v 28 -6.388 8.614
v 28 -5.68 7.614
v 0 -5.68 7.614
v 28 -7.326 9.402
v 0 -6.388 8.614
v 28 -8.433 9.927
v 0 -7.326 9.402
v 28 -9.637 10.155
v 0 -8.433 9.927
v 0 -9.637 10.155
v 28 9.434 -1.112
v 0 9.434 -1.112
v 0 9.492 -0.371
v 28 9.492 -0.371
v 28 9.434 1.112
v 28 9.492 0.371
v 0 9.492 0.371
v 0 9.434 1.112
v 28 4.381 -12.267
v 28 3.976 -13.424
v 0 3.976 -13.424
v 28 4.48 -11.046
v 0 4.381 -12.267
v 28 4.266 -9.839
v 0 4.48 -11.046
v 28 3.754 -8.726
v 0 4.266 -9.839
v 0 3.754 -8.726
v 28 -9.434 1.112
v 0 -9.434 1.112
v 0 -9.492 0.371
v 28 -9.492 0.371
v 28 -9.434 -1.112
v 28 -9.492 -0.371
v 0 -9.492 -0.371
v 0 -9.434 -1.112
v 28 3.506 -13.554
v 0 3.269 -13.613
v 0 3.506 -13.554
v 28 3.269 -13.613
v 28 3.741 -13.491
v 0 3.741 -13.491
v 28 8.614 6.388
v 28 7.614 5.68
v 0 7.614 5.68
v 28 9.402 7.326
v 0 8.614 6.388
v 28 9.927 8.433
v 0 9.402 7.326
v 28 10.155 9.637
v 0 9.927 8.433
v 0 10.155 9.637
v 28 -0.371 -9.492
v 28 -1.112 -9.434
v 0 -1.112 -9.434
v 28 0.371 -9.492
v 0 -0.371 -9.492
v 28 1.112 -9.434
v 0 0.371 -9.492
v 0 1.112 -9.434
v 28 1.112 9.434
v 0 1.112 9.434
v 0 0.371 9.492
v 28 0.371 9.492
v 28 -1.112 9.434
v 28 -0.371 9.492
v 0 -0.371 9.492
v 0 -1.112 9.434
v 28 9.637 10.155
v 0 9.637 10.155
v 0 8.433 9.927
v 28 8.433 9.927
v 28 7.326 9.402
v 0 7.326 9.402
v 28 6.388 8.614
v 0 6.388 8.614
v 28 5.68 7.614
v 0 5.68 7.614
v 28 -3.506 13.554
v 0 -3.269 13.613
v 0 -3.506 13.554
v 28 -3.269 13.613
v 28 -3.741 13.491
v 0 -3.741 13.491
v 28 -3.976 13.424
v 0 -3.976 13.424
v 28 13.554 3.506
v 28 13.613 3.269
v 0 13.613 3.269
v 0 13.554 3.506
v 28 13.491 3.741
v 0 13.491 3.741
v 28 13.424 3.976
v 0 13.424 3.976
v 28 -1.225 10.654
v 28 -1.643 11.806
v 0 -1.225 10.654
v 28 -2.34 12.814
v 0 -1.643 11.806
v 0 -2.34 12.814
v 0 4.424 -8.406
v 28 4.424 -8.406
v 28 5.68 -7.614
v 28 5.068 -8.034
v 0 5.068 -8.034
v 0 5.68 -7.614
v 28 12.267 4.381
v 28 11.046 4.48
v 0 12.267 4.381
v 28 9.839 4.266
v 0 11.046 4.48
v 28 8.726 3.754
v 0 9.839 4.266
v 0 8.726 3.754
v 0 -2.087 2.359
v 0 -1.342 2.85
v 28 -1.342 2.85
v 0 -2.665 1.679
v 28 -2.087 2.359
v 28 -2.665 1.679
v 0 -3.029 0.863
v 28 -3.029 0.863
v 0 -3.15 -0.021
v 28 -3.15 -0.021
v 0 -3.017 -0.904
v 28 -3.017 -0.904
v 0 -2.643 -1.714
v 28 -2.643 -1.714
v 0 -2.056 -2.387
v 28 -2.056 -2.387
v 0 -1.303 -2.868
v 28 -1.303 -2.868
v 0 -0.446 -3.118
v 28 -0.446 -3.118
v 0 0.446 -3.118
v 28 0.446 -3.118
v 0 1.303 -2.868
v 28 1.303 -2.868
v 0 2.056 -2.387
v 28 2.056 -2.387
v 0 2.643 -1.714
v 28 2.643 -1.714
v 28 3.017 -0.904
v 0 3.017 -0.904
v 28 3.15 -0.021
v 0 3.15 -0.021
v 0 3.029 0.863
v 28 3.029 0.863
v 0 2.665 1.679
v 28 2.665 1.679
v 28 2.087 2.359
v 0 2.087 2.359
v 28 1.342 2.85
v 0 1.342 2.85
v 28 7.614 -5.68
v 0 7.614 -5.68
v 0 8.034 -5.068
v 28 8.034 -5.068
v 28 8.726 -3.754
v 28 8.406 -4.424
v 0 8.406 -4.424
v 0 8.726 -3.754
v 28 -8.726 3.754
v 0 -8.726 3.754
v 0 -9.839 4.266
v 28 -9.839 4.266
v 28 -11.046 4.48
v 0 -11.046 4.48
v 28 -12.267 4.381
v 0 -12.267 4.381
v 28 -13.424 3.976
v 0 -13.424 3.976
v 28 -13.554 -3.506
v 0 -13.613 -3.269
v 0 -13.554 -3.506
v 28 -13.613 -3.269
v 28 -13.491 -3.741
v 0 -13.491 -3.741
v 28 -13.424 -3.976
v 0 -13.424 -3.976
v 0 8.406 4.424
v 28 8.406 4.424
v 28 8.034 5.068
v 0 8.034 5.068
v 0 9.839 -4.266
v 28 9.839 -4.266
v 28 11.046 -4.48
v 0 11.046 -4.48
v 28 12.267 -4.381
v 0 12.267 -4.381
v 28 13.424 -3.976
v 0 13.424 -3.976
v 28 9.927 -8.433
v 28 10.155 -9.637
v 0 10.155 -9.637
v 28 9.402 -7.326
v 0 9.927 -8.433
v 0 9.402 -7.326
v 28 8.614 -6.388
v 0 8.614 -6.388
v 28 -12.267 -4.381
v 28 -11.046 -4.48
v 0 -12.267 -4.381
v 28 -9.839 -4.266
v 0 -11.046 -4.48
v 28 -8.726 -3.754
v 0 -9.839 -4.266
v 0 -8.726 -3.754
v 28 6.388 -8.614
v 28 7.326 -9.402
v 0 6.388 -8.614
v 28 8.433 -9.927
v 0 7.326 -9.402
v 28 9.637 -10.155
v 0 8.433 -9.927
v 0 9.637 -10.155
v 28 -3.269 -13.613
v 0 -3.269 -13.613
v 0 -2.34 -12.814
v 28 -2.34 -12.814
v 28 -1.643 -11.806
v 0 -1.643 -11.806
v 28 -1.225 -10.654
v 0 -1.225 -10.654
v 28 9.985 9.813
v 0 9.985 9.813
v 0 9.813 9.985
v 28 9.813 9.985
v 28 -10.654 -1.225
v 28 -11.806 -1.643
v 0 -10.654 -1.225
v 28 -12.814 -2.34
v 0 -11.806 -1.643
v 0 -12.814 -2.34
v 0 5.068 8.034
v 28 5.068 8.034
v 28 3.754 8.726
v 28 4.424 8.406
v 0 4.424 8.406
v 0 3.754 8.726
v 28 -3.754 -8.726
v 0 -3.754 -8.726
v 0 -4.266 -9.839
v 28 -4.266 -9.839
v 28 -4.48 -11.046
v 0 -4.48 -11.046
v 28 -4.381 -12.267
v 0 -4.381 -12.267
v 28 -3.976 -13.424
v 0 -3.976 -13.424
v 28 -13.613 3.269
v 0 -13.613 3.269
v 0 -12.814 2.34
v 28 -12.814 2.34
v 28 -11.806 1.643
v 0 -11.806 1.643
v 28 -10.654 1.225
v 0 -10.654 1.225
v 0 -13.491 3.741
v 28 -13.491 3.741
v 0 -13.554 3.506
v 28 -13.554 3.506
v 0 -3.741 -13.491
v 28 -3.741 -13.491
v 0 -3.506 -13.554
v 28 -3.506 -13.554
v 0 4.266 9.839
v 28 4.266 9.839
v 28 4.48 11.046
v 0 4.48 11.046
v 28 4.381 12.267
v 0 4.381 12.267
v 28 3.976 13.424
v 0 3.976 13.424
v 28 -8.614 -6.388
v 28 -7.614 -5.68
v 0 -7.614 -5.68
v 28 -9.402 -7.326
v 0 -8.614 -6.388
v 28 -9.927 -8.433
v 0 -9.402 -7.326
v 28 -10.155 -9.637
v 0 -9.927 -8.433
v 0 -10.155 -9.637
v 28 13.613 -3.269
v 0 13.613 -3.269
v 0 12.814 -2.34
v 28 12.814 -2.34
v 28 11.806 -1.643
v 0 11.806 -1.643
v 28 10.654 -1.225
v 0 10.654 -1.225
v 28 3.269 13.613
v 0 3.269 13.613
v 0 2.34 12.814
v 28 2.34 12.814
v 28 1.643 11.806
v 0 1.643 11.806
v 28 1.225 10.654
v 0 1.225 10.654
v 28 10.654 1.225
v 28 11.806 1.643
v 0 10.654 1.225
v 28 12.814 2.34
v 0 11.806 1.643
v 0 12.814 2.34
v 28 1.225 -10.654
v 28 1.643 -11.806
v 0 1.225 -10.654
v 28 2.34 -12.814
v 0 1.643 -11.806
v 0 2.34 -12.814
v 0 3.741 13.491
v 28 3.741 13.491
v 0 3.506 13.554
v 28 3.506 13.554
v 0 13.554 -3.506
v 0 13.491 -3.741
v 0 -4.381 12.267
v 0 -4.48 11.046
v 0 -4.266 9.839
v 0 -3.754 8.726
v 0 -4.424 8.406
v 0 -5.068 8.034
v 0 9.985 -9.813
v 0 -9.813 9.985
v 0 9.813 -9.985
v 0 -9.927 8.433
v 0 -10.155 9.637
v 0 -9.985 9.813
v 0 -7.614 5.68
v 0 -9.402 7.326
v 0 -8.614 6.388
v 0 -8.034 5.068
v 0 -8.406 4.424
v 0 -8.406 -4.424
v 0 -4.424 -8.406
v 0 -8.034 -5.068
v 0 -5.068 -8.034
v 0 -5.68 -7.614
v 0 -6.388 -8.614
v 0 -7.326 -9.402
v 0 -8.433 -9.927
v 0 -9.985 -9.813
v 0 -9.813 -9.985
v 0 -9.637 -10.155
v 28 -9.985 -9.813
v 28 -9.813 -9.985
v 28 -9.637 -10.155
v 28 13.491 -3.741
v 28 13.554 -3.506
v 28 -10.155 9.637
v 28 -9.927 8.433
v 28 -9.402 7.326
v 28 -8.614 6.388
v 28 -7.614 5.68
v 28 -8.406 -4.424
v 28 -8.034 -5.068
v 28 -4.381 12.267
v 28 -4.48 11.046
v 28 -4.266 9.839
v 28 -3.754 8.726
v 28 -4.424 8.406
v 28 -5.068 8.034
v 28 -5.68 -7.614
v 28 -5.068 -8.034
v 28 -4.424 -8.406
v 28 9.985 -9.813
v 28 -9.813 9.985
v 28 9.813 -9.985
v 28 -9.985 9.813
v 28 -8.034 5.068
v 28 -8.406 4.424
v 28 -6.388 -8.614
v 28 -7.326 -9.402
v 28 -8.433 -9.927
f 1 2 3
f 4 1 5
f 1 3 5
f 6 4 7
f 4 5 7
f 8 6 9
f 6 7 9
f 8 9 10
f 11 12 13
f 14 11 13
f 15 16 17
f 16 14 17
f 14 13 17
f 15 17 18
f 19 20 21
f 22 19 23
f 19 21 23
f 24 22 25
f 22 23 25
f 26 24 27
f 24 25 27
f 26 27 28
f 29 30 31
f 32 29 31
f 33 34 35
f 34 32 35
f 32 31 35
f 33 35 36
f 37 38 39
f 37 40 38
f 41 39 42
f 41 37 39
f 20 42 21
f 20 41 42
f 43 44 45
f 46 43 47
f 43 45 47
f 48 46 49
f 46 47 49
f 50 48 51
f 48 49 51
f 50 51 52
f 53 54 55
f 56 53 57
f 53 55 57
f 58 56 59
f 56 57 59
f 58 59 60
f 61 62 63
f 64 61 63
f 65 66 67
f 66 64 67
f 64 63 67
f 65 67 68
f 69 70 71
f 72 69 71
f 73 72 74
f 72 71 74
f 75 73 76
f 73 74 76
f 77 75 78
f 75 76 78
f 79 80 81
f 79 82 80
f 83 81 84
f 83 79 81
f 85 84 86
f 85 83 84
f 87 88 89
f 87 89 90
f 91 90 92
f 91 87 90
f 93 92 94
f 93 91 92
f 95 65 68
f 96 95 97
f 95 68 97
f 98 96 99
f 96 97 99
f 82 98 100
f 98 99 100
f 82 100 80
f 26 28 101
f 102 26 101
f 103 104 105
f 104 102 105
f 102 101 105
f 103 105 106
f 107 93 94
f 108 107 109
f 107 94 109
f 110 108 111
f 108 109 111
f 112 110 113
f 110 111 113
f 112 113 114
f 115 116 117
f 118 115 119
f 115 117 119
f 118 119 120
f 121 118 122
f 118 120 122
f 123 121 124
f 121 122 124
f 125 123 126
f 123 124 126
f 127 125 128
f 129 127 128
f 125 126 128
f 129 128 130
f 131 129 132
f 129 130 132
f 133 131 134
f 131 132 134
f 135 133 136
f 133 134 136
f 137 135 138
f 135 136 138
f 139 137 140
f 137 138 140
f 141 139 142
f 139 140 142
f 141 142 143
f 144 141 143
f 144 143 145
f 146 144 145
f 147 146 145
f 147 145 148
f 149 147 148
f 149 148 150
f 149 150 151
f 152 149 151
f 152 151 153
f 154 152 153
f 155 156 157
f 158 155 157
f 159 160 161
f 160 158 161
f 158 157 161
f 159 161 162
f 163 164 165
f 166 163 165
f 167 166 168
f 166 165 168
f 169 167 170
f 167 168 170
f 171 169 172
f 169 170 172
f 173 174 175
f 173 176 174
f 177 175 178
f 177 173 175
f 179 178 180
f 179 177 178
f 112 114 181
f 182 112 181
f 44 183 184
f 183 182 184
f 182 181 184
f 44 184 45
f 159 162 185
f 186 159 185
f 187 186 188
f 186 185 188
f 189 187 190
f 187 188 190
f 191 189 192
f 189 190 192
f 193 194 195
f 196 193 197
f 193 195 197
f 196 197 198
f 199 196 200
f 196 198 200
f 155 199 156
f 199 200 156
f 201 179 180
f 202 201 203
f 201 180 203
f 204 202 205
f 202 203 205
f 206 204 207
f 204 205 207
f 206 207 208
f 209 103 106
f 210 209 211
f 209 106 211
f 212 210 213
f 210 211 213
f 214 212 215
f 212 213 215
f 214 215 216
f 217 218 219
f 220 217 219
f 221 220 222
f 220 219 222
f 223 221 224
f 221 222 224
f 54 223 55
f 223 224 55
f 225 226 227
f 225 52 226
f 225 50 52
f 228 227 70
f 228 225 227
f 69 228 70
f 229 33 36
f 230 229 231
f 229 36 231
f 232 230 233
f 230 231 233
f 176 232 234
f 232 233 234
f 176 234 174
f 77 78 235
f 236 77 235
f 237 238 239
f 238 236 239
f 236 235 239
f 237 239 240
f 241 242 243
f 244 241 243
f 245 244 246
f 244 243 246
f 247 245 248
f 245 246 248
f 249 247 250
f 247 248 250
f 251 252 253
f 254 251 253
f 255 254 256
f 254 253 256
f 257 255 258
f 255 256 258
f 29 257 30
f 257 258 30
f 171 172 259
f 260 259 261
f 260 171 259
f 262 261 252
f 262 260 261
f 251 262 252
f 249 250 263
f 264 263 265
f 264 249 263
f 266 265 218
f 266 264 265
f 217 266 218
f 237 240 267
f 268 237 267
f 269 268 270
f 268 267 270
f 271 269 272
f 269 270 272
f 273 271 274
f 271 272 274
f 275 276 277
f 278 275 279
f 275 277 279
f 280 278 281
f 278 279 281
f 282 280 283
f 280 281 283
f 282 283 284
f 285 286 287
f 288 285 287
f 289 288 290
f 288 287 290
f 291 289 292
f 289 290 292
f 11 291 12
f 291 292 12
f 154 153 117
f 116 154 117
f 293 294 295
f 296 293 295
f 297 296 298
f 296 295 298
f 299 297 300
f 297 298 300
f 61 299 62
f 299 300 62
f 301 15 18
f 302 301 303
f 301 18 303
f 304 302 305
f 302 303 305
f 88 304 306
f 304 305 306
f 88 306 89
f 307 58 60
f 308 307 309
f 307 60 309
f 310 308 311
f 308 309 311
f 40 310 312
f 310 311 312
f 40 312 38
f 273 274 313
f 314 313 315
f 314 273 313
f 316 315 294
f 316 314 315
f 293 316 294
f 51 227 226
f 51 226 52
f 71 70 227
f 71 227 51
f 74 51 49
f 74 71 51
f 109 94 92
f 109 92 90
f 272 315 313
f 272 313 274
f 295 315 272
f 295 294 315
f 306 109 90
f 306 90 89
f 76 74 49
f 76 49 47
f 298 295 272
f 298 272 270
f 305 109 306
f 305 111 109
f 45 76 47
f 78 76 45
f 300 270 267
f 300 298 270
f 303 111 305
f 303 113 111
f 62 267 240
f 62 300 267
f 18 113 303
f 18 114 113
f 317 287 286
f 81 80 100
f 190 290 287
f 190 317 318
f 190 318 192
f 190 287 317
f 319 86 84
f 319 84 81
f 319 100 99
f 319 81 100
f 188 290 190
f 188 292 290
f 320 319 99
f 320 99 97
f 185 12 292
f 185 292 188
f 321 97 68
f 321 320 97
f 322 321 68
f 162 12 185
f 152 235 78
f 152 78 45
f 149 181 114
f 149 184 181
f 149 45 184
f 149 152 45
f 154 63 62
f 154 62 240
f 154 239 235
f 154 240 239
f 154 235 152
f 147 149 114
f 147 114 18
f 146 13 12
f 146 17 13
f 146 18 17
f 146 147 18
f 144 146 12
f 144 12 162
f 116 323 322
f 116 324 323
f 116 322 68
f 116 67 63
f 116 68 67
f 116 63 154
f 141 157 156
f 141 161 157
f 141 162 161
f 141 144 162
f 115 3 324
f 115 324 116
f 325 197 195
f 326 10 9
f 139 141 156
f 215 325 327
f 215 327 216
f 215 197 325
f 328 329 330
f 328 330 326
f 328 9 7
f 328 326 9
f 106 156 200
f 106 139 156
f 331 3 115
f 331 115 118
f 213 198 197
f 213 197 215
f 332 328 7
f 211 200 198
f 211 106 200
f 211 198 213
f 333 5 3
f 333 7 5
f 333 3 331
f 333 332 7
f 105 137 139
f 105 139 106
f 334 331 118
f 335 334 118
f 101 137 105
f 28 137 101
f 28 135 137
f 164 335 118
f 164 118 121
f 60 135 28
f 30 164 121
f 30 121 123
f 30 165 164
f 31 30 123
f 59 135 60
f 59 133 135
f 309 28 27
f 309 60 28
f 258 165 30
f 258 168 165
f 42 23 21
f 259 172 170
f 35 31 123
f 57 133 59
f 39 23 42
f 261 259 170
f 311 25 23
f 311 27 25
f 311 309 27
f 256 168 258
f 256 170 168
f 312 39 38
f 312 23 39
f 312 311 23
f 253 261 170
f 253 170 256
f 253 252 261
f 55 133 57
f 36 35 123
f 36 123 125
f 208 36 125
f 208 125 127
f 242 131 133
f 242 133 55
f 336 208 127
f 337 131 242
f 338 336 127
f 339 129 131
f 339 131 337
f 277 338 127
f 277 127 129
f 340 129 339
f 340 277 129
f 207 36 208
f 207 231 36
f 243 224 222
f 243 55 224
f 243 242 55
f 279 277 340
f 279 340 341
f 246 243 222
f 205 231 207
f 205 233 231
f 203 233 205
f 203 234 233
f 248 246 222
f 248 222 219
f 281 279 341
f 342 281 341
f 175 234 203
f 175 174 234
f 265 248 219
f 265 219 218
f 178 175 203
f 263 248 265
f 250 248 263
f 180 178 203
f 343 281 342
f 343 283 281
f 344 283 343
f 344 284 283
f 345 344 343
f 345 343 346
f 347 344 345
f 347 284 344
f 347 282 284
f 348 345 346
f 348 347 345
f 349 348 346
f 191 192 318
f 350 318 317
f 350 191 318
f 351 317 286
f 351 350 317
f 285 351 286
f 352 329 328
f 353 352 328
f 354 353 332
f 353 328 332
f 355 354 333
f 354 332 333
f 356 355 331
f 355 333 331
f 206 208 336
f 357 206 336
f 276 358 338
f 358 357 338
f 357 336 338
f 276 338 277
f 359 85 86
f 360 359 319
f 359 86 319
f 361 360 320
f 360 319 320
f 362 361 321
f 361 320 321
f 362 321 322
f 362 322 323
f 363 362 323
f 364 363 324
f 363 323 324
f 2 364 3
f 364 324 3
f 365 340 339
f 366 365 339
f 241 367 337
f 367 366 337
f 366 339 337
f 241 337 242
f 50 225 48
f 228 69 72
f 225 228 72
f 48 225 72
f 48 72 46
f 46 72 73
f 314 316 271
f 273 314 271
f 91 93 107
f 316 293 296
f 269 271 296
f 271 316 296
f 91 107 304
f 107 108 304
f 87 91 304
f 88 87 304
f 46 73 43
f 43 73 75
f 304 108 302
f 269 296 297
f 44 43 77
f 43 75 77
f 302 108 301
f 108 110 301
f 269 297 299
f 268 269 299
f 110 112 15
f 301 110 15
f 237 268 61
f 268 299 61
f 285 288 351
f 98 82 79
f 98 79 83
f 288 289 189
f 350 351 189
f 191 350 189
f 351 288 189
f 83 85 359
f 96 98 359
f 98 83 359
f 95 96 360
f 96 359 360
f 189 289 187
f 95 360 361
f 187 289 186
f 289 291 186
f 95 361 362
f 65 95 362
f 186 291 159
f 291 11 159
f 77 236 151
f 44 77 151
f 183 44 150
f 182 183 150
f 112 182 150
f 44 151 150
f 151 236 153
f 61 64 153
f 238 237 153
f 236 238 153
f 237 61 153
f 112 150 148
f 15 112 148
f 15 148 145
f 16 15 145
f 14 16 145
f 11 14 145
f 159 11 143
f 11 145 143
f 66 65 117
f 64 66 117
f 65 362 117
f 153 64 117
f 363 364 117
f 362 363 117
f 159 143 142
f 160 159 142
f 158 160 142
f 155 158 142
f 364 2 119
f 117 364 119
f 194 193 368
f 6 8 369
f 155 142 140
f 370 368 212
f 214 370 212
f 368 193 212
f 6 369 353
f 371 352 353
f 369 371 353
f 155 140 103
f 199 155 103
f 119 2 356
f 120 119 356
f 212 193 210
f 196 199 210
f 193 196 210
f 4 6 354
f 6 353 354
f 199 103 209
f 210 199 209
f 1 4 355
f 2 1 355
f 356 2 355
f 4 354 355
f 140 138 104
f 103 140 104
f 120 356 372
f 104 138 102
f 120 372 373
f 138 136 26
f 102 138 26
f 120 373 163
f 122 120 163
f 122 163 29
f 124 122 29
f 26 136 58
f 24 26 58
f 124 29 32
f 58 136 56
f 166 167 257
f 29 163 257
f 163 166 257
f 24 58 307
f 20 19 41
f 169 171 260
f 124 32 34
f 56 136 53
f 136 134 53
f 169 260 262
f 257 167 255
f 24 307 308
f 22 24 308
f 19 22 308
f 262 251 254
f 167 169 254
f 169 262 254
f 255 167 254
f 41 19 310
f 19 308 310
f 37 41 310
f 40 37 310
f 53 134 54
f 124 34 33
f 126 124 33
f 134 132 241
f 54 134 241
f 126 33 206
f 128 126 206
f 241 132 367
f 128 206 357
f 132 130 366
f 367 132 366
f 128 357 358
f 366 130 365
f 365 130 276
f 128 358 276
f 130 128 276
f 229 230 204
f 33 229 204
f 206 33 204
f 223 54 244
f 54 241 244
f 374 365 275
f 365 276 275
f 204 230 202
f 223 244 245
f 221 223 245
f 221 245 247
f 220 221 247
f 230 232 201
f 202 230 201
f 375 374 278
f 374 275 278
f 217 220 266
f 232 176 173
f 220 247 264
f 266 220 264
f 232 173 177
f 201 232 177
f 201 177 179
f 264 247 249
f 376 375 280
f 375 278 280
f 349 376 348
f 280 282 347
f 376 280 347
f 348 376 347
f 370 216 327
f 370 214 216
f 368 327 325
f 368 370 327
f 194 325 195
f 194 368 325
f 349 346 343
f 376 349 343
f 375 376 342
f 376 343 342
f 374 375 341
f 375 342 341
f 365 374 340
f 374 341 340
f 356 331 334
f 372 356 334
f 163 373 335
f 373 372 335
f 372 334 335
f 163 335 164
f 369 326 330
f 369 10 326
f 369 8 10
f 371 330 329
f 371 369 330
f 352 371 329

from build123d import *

# Parameters (mm, degrees)
BASPROSKE_W              = 28
BASPROSKE_H              = 14
TOOTHCUT_DEPTH           = 35.292856399
TEETHCUTS_COUNT          = 12
TEETHCUTS_ANGLE          = 330
BORSKE_R                 = 5
BORE_DEPTH               = 50.0000508
KEYSKE_W                 = 4
KEYSKE_H                 = 6.8
KEYWAY_DEPTH             = 50.0000508
RESSALTO_EXTRUS_O1_START = -28
ESBO_O1_R                = 9.499
RESSALTO_EXTRUS_O1_DEPTH = 28
CORTE_EXTRUS_O1_REACH    = 35.98


with BuildPart() as part:
    # BasProSke → Base-Revolve (revolve)
    with BuildSketch(Plane(origin=(0, 0, 0), x_dir=(1, 0, 0), z_dir=(0, 1, 0)), mode=Mode.PRIVATE) as base_revolve_sk:
        with Locations((14, 7)):
            Rectangle(BASPROSKE_W, BASPROSKE_H)
    revolve(base_revolve_sk.sketch.rotate(Axis((-10, 0, 0), (1, 0, 0)), 180), axis=Axis((-10, 0, 0), (1, 0, 0)))

    # TooCutSke → ToothCut (cut, through all)
    with BuildSketch(Plane(origin=(0, 0, 0), x_dir=(0, 0, -1), z_dir=(1, 0, 0))):
        with BuildLine():
            ThreePointArc((1.111908866, 9.433698091), (0, 9.499), (-1.111908866, 9.433698091))
            ThreePointArc((-1.111908866, 9.433698091), (-1.651516138, 11.821129337), (-3.298149691, 13.632096456))
            ThreePointArc((-3.298149691, 13.632096456), (0, 14.0254), (3.298149691, 13.632096456))
            ThreePointArc((3.298149691, 13.632096456), (1.651516138, 11.821129337), (1.111908866, 9.433698091))
        make_face()
    toothcut = extrude(amount=TOOTHCUT_DEPTH, mode=Mode.SUBTRACT)

    # TeethCuts: ToothCut ×12 about axis
    teethcuts_axis = Axis((-10, 0, 0), (1, 0, 0))
    for i in range(1, TEETHCUTS_COUNT):
        add(toothcut.rotate(teethcuts_axis, i * TEETHCUTS_ANGLE / (TEETHCUTS_COUNT - 1)), mode=Mode.SUBTRACT)

    # BorSke → Bore (cut, symmetric)
    with BuildSketch(Plane(origin=(0, 0, 0), x_dir=(0, 0, -1), z_dir=(1, 0, 0))):
        with Locations(Location((0, 0, 0), (0, 0, 180))):
            Circle(BORSKE_R)
    extrude(amount=BORE_DEPTH, both=True, mode=Mode.SUBTRACT)

    # KeySke → Keyway (cut, symmetric)
    with BuildSketch(Plane(origin=(0, 0, 0), x_dir=(0, 0, -1), z_dir=(1, 0, 0))):
        with Locations((0, 3.4)):
            Rectangle(KEYSKE_W, KEYSKE_H)
    extrude(amount=KEYWAY_DEPTH, both=True, mode=Mode.SUBTRACT)

    # Esboço1 → Ressalto-extrusão1 (add)
    with BuildSketch(Plane(origin=(28, 0, 0), x_dir=(0, 0, -1), z_dir=(1, 0, 0)).offset(RESSALTO_EXTRUS_O1_START)):
        Circle(ESBO_O1_R)
    extrude(amount=RESSALTO_EXTRUS_O1_DEPTH)

    # Esboço2 → Corte-extrusão1 (cut, up to next)
    with BuildSketch(Plane(origin=(28, 0, 0), x_dir=(0, 0, -1), z_dir=(1, 0, 0)), mode=Mode.PRIVATE) as corte_extrus_o1_sk1:
        with BuildLine():
            Line((-2.85, 1.341640786), (-2.85, -1.341640786))
            ThreePointArc((-2.85, -1.341640786), (3.15, 0), (-2.85, 1.341640786))
        make_face()
    corte_extrus_o1_tool1 = extrude(corte_extrus_o1_sk1.sketch, amount=-CORTE_EXTRUS_O1_REACH, mode=Mode.PRIVATE) & part.part
    add(corte_extrus_o1_tool1.solids().sort_by_distance((28, 0, -0.052561))[0], mode=Mode.SUBTRACT)


solid = part.part
